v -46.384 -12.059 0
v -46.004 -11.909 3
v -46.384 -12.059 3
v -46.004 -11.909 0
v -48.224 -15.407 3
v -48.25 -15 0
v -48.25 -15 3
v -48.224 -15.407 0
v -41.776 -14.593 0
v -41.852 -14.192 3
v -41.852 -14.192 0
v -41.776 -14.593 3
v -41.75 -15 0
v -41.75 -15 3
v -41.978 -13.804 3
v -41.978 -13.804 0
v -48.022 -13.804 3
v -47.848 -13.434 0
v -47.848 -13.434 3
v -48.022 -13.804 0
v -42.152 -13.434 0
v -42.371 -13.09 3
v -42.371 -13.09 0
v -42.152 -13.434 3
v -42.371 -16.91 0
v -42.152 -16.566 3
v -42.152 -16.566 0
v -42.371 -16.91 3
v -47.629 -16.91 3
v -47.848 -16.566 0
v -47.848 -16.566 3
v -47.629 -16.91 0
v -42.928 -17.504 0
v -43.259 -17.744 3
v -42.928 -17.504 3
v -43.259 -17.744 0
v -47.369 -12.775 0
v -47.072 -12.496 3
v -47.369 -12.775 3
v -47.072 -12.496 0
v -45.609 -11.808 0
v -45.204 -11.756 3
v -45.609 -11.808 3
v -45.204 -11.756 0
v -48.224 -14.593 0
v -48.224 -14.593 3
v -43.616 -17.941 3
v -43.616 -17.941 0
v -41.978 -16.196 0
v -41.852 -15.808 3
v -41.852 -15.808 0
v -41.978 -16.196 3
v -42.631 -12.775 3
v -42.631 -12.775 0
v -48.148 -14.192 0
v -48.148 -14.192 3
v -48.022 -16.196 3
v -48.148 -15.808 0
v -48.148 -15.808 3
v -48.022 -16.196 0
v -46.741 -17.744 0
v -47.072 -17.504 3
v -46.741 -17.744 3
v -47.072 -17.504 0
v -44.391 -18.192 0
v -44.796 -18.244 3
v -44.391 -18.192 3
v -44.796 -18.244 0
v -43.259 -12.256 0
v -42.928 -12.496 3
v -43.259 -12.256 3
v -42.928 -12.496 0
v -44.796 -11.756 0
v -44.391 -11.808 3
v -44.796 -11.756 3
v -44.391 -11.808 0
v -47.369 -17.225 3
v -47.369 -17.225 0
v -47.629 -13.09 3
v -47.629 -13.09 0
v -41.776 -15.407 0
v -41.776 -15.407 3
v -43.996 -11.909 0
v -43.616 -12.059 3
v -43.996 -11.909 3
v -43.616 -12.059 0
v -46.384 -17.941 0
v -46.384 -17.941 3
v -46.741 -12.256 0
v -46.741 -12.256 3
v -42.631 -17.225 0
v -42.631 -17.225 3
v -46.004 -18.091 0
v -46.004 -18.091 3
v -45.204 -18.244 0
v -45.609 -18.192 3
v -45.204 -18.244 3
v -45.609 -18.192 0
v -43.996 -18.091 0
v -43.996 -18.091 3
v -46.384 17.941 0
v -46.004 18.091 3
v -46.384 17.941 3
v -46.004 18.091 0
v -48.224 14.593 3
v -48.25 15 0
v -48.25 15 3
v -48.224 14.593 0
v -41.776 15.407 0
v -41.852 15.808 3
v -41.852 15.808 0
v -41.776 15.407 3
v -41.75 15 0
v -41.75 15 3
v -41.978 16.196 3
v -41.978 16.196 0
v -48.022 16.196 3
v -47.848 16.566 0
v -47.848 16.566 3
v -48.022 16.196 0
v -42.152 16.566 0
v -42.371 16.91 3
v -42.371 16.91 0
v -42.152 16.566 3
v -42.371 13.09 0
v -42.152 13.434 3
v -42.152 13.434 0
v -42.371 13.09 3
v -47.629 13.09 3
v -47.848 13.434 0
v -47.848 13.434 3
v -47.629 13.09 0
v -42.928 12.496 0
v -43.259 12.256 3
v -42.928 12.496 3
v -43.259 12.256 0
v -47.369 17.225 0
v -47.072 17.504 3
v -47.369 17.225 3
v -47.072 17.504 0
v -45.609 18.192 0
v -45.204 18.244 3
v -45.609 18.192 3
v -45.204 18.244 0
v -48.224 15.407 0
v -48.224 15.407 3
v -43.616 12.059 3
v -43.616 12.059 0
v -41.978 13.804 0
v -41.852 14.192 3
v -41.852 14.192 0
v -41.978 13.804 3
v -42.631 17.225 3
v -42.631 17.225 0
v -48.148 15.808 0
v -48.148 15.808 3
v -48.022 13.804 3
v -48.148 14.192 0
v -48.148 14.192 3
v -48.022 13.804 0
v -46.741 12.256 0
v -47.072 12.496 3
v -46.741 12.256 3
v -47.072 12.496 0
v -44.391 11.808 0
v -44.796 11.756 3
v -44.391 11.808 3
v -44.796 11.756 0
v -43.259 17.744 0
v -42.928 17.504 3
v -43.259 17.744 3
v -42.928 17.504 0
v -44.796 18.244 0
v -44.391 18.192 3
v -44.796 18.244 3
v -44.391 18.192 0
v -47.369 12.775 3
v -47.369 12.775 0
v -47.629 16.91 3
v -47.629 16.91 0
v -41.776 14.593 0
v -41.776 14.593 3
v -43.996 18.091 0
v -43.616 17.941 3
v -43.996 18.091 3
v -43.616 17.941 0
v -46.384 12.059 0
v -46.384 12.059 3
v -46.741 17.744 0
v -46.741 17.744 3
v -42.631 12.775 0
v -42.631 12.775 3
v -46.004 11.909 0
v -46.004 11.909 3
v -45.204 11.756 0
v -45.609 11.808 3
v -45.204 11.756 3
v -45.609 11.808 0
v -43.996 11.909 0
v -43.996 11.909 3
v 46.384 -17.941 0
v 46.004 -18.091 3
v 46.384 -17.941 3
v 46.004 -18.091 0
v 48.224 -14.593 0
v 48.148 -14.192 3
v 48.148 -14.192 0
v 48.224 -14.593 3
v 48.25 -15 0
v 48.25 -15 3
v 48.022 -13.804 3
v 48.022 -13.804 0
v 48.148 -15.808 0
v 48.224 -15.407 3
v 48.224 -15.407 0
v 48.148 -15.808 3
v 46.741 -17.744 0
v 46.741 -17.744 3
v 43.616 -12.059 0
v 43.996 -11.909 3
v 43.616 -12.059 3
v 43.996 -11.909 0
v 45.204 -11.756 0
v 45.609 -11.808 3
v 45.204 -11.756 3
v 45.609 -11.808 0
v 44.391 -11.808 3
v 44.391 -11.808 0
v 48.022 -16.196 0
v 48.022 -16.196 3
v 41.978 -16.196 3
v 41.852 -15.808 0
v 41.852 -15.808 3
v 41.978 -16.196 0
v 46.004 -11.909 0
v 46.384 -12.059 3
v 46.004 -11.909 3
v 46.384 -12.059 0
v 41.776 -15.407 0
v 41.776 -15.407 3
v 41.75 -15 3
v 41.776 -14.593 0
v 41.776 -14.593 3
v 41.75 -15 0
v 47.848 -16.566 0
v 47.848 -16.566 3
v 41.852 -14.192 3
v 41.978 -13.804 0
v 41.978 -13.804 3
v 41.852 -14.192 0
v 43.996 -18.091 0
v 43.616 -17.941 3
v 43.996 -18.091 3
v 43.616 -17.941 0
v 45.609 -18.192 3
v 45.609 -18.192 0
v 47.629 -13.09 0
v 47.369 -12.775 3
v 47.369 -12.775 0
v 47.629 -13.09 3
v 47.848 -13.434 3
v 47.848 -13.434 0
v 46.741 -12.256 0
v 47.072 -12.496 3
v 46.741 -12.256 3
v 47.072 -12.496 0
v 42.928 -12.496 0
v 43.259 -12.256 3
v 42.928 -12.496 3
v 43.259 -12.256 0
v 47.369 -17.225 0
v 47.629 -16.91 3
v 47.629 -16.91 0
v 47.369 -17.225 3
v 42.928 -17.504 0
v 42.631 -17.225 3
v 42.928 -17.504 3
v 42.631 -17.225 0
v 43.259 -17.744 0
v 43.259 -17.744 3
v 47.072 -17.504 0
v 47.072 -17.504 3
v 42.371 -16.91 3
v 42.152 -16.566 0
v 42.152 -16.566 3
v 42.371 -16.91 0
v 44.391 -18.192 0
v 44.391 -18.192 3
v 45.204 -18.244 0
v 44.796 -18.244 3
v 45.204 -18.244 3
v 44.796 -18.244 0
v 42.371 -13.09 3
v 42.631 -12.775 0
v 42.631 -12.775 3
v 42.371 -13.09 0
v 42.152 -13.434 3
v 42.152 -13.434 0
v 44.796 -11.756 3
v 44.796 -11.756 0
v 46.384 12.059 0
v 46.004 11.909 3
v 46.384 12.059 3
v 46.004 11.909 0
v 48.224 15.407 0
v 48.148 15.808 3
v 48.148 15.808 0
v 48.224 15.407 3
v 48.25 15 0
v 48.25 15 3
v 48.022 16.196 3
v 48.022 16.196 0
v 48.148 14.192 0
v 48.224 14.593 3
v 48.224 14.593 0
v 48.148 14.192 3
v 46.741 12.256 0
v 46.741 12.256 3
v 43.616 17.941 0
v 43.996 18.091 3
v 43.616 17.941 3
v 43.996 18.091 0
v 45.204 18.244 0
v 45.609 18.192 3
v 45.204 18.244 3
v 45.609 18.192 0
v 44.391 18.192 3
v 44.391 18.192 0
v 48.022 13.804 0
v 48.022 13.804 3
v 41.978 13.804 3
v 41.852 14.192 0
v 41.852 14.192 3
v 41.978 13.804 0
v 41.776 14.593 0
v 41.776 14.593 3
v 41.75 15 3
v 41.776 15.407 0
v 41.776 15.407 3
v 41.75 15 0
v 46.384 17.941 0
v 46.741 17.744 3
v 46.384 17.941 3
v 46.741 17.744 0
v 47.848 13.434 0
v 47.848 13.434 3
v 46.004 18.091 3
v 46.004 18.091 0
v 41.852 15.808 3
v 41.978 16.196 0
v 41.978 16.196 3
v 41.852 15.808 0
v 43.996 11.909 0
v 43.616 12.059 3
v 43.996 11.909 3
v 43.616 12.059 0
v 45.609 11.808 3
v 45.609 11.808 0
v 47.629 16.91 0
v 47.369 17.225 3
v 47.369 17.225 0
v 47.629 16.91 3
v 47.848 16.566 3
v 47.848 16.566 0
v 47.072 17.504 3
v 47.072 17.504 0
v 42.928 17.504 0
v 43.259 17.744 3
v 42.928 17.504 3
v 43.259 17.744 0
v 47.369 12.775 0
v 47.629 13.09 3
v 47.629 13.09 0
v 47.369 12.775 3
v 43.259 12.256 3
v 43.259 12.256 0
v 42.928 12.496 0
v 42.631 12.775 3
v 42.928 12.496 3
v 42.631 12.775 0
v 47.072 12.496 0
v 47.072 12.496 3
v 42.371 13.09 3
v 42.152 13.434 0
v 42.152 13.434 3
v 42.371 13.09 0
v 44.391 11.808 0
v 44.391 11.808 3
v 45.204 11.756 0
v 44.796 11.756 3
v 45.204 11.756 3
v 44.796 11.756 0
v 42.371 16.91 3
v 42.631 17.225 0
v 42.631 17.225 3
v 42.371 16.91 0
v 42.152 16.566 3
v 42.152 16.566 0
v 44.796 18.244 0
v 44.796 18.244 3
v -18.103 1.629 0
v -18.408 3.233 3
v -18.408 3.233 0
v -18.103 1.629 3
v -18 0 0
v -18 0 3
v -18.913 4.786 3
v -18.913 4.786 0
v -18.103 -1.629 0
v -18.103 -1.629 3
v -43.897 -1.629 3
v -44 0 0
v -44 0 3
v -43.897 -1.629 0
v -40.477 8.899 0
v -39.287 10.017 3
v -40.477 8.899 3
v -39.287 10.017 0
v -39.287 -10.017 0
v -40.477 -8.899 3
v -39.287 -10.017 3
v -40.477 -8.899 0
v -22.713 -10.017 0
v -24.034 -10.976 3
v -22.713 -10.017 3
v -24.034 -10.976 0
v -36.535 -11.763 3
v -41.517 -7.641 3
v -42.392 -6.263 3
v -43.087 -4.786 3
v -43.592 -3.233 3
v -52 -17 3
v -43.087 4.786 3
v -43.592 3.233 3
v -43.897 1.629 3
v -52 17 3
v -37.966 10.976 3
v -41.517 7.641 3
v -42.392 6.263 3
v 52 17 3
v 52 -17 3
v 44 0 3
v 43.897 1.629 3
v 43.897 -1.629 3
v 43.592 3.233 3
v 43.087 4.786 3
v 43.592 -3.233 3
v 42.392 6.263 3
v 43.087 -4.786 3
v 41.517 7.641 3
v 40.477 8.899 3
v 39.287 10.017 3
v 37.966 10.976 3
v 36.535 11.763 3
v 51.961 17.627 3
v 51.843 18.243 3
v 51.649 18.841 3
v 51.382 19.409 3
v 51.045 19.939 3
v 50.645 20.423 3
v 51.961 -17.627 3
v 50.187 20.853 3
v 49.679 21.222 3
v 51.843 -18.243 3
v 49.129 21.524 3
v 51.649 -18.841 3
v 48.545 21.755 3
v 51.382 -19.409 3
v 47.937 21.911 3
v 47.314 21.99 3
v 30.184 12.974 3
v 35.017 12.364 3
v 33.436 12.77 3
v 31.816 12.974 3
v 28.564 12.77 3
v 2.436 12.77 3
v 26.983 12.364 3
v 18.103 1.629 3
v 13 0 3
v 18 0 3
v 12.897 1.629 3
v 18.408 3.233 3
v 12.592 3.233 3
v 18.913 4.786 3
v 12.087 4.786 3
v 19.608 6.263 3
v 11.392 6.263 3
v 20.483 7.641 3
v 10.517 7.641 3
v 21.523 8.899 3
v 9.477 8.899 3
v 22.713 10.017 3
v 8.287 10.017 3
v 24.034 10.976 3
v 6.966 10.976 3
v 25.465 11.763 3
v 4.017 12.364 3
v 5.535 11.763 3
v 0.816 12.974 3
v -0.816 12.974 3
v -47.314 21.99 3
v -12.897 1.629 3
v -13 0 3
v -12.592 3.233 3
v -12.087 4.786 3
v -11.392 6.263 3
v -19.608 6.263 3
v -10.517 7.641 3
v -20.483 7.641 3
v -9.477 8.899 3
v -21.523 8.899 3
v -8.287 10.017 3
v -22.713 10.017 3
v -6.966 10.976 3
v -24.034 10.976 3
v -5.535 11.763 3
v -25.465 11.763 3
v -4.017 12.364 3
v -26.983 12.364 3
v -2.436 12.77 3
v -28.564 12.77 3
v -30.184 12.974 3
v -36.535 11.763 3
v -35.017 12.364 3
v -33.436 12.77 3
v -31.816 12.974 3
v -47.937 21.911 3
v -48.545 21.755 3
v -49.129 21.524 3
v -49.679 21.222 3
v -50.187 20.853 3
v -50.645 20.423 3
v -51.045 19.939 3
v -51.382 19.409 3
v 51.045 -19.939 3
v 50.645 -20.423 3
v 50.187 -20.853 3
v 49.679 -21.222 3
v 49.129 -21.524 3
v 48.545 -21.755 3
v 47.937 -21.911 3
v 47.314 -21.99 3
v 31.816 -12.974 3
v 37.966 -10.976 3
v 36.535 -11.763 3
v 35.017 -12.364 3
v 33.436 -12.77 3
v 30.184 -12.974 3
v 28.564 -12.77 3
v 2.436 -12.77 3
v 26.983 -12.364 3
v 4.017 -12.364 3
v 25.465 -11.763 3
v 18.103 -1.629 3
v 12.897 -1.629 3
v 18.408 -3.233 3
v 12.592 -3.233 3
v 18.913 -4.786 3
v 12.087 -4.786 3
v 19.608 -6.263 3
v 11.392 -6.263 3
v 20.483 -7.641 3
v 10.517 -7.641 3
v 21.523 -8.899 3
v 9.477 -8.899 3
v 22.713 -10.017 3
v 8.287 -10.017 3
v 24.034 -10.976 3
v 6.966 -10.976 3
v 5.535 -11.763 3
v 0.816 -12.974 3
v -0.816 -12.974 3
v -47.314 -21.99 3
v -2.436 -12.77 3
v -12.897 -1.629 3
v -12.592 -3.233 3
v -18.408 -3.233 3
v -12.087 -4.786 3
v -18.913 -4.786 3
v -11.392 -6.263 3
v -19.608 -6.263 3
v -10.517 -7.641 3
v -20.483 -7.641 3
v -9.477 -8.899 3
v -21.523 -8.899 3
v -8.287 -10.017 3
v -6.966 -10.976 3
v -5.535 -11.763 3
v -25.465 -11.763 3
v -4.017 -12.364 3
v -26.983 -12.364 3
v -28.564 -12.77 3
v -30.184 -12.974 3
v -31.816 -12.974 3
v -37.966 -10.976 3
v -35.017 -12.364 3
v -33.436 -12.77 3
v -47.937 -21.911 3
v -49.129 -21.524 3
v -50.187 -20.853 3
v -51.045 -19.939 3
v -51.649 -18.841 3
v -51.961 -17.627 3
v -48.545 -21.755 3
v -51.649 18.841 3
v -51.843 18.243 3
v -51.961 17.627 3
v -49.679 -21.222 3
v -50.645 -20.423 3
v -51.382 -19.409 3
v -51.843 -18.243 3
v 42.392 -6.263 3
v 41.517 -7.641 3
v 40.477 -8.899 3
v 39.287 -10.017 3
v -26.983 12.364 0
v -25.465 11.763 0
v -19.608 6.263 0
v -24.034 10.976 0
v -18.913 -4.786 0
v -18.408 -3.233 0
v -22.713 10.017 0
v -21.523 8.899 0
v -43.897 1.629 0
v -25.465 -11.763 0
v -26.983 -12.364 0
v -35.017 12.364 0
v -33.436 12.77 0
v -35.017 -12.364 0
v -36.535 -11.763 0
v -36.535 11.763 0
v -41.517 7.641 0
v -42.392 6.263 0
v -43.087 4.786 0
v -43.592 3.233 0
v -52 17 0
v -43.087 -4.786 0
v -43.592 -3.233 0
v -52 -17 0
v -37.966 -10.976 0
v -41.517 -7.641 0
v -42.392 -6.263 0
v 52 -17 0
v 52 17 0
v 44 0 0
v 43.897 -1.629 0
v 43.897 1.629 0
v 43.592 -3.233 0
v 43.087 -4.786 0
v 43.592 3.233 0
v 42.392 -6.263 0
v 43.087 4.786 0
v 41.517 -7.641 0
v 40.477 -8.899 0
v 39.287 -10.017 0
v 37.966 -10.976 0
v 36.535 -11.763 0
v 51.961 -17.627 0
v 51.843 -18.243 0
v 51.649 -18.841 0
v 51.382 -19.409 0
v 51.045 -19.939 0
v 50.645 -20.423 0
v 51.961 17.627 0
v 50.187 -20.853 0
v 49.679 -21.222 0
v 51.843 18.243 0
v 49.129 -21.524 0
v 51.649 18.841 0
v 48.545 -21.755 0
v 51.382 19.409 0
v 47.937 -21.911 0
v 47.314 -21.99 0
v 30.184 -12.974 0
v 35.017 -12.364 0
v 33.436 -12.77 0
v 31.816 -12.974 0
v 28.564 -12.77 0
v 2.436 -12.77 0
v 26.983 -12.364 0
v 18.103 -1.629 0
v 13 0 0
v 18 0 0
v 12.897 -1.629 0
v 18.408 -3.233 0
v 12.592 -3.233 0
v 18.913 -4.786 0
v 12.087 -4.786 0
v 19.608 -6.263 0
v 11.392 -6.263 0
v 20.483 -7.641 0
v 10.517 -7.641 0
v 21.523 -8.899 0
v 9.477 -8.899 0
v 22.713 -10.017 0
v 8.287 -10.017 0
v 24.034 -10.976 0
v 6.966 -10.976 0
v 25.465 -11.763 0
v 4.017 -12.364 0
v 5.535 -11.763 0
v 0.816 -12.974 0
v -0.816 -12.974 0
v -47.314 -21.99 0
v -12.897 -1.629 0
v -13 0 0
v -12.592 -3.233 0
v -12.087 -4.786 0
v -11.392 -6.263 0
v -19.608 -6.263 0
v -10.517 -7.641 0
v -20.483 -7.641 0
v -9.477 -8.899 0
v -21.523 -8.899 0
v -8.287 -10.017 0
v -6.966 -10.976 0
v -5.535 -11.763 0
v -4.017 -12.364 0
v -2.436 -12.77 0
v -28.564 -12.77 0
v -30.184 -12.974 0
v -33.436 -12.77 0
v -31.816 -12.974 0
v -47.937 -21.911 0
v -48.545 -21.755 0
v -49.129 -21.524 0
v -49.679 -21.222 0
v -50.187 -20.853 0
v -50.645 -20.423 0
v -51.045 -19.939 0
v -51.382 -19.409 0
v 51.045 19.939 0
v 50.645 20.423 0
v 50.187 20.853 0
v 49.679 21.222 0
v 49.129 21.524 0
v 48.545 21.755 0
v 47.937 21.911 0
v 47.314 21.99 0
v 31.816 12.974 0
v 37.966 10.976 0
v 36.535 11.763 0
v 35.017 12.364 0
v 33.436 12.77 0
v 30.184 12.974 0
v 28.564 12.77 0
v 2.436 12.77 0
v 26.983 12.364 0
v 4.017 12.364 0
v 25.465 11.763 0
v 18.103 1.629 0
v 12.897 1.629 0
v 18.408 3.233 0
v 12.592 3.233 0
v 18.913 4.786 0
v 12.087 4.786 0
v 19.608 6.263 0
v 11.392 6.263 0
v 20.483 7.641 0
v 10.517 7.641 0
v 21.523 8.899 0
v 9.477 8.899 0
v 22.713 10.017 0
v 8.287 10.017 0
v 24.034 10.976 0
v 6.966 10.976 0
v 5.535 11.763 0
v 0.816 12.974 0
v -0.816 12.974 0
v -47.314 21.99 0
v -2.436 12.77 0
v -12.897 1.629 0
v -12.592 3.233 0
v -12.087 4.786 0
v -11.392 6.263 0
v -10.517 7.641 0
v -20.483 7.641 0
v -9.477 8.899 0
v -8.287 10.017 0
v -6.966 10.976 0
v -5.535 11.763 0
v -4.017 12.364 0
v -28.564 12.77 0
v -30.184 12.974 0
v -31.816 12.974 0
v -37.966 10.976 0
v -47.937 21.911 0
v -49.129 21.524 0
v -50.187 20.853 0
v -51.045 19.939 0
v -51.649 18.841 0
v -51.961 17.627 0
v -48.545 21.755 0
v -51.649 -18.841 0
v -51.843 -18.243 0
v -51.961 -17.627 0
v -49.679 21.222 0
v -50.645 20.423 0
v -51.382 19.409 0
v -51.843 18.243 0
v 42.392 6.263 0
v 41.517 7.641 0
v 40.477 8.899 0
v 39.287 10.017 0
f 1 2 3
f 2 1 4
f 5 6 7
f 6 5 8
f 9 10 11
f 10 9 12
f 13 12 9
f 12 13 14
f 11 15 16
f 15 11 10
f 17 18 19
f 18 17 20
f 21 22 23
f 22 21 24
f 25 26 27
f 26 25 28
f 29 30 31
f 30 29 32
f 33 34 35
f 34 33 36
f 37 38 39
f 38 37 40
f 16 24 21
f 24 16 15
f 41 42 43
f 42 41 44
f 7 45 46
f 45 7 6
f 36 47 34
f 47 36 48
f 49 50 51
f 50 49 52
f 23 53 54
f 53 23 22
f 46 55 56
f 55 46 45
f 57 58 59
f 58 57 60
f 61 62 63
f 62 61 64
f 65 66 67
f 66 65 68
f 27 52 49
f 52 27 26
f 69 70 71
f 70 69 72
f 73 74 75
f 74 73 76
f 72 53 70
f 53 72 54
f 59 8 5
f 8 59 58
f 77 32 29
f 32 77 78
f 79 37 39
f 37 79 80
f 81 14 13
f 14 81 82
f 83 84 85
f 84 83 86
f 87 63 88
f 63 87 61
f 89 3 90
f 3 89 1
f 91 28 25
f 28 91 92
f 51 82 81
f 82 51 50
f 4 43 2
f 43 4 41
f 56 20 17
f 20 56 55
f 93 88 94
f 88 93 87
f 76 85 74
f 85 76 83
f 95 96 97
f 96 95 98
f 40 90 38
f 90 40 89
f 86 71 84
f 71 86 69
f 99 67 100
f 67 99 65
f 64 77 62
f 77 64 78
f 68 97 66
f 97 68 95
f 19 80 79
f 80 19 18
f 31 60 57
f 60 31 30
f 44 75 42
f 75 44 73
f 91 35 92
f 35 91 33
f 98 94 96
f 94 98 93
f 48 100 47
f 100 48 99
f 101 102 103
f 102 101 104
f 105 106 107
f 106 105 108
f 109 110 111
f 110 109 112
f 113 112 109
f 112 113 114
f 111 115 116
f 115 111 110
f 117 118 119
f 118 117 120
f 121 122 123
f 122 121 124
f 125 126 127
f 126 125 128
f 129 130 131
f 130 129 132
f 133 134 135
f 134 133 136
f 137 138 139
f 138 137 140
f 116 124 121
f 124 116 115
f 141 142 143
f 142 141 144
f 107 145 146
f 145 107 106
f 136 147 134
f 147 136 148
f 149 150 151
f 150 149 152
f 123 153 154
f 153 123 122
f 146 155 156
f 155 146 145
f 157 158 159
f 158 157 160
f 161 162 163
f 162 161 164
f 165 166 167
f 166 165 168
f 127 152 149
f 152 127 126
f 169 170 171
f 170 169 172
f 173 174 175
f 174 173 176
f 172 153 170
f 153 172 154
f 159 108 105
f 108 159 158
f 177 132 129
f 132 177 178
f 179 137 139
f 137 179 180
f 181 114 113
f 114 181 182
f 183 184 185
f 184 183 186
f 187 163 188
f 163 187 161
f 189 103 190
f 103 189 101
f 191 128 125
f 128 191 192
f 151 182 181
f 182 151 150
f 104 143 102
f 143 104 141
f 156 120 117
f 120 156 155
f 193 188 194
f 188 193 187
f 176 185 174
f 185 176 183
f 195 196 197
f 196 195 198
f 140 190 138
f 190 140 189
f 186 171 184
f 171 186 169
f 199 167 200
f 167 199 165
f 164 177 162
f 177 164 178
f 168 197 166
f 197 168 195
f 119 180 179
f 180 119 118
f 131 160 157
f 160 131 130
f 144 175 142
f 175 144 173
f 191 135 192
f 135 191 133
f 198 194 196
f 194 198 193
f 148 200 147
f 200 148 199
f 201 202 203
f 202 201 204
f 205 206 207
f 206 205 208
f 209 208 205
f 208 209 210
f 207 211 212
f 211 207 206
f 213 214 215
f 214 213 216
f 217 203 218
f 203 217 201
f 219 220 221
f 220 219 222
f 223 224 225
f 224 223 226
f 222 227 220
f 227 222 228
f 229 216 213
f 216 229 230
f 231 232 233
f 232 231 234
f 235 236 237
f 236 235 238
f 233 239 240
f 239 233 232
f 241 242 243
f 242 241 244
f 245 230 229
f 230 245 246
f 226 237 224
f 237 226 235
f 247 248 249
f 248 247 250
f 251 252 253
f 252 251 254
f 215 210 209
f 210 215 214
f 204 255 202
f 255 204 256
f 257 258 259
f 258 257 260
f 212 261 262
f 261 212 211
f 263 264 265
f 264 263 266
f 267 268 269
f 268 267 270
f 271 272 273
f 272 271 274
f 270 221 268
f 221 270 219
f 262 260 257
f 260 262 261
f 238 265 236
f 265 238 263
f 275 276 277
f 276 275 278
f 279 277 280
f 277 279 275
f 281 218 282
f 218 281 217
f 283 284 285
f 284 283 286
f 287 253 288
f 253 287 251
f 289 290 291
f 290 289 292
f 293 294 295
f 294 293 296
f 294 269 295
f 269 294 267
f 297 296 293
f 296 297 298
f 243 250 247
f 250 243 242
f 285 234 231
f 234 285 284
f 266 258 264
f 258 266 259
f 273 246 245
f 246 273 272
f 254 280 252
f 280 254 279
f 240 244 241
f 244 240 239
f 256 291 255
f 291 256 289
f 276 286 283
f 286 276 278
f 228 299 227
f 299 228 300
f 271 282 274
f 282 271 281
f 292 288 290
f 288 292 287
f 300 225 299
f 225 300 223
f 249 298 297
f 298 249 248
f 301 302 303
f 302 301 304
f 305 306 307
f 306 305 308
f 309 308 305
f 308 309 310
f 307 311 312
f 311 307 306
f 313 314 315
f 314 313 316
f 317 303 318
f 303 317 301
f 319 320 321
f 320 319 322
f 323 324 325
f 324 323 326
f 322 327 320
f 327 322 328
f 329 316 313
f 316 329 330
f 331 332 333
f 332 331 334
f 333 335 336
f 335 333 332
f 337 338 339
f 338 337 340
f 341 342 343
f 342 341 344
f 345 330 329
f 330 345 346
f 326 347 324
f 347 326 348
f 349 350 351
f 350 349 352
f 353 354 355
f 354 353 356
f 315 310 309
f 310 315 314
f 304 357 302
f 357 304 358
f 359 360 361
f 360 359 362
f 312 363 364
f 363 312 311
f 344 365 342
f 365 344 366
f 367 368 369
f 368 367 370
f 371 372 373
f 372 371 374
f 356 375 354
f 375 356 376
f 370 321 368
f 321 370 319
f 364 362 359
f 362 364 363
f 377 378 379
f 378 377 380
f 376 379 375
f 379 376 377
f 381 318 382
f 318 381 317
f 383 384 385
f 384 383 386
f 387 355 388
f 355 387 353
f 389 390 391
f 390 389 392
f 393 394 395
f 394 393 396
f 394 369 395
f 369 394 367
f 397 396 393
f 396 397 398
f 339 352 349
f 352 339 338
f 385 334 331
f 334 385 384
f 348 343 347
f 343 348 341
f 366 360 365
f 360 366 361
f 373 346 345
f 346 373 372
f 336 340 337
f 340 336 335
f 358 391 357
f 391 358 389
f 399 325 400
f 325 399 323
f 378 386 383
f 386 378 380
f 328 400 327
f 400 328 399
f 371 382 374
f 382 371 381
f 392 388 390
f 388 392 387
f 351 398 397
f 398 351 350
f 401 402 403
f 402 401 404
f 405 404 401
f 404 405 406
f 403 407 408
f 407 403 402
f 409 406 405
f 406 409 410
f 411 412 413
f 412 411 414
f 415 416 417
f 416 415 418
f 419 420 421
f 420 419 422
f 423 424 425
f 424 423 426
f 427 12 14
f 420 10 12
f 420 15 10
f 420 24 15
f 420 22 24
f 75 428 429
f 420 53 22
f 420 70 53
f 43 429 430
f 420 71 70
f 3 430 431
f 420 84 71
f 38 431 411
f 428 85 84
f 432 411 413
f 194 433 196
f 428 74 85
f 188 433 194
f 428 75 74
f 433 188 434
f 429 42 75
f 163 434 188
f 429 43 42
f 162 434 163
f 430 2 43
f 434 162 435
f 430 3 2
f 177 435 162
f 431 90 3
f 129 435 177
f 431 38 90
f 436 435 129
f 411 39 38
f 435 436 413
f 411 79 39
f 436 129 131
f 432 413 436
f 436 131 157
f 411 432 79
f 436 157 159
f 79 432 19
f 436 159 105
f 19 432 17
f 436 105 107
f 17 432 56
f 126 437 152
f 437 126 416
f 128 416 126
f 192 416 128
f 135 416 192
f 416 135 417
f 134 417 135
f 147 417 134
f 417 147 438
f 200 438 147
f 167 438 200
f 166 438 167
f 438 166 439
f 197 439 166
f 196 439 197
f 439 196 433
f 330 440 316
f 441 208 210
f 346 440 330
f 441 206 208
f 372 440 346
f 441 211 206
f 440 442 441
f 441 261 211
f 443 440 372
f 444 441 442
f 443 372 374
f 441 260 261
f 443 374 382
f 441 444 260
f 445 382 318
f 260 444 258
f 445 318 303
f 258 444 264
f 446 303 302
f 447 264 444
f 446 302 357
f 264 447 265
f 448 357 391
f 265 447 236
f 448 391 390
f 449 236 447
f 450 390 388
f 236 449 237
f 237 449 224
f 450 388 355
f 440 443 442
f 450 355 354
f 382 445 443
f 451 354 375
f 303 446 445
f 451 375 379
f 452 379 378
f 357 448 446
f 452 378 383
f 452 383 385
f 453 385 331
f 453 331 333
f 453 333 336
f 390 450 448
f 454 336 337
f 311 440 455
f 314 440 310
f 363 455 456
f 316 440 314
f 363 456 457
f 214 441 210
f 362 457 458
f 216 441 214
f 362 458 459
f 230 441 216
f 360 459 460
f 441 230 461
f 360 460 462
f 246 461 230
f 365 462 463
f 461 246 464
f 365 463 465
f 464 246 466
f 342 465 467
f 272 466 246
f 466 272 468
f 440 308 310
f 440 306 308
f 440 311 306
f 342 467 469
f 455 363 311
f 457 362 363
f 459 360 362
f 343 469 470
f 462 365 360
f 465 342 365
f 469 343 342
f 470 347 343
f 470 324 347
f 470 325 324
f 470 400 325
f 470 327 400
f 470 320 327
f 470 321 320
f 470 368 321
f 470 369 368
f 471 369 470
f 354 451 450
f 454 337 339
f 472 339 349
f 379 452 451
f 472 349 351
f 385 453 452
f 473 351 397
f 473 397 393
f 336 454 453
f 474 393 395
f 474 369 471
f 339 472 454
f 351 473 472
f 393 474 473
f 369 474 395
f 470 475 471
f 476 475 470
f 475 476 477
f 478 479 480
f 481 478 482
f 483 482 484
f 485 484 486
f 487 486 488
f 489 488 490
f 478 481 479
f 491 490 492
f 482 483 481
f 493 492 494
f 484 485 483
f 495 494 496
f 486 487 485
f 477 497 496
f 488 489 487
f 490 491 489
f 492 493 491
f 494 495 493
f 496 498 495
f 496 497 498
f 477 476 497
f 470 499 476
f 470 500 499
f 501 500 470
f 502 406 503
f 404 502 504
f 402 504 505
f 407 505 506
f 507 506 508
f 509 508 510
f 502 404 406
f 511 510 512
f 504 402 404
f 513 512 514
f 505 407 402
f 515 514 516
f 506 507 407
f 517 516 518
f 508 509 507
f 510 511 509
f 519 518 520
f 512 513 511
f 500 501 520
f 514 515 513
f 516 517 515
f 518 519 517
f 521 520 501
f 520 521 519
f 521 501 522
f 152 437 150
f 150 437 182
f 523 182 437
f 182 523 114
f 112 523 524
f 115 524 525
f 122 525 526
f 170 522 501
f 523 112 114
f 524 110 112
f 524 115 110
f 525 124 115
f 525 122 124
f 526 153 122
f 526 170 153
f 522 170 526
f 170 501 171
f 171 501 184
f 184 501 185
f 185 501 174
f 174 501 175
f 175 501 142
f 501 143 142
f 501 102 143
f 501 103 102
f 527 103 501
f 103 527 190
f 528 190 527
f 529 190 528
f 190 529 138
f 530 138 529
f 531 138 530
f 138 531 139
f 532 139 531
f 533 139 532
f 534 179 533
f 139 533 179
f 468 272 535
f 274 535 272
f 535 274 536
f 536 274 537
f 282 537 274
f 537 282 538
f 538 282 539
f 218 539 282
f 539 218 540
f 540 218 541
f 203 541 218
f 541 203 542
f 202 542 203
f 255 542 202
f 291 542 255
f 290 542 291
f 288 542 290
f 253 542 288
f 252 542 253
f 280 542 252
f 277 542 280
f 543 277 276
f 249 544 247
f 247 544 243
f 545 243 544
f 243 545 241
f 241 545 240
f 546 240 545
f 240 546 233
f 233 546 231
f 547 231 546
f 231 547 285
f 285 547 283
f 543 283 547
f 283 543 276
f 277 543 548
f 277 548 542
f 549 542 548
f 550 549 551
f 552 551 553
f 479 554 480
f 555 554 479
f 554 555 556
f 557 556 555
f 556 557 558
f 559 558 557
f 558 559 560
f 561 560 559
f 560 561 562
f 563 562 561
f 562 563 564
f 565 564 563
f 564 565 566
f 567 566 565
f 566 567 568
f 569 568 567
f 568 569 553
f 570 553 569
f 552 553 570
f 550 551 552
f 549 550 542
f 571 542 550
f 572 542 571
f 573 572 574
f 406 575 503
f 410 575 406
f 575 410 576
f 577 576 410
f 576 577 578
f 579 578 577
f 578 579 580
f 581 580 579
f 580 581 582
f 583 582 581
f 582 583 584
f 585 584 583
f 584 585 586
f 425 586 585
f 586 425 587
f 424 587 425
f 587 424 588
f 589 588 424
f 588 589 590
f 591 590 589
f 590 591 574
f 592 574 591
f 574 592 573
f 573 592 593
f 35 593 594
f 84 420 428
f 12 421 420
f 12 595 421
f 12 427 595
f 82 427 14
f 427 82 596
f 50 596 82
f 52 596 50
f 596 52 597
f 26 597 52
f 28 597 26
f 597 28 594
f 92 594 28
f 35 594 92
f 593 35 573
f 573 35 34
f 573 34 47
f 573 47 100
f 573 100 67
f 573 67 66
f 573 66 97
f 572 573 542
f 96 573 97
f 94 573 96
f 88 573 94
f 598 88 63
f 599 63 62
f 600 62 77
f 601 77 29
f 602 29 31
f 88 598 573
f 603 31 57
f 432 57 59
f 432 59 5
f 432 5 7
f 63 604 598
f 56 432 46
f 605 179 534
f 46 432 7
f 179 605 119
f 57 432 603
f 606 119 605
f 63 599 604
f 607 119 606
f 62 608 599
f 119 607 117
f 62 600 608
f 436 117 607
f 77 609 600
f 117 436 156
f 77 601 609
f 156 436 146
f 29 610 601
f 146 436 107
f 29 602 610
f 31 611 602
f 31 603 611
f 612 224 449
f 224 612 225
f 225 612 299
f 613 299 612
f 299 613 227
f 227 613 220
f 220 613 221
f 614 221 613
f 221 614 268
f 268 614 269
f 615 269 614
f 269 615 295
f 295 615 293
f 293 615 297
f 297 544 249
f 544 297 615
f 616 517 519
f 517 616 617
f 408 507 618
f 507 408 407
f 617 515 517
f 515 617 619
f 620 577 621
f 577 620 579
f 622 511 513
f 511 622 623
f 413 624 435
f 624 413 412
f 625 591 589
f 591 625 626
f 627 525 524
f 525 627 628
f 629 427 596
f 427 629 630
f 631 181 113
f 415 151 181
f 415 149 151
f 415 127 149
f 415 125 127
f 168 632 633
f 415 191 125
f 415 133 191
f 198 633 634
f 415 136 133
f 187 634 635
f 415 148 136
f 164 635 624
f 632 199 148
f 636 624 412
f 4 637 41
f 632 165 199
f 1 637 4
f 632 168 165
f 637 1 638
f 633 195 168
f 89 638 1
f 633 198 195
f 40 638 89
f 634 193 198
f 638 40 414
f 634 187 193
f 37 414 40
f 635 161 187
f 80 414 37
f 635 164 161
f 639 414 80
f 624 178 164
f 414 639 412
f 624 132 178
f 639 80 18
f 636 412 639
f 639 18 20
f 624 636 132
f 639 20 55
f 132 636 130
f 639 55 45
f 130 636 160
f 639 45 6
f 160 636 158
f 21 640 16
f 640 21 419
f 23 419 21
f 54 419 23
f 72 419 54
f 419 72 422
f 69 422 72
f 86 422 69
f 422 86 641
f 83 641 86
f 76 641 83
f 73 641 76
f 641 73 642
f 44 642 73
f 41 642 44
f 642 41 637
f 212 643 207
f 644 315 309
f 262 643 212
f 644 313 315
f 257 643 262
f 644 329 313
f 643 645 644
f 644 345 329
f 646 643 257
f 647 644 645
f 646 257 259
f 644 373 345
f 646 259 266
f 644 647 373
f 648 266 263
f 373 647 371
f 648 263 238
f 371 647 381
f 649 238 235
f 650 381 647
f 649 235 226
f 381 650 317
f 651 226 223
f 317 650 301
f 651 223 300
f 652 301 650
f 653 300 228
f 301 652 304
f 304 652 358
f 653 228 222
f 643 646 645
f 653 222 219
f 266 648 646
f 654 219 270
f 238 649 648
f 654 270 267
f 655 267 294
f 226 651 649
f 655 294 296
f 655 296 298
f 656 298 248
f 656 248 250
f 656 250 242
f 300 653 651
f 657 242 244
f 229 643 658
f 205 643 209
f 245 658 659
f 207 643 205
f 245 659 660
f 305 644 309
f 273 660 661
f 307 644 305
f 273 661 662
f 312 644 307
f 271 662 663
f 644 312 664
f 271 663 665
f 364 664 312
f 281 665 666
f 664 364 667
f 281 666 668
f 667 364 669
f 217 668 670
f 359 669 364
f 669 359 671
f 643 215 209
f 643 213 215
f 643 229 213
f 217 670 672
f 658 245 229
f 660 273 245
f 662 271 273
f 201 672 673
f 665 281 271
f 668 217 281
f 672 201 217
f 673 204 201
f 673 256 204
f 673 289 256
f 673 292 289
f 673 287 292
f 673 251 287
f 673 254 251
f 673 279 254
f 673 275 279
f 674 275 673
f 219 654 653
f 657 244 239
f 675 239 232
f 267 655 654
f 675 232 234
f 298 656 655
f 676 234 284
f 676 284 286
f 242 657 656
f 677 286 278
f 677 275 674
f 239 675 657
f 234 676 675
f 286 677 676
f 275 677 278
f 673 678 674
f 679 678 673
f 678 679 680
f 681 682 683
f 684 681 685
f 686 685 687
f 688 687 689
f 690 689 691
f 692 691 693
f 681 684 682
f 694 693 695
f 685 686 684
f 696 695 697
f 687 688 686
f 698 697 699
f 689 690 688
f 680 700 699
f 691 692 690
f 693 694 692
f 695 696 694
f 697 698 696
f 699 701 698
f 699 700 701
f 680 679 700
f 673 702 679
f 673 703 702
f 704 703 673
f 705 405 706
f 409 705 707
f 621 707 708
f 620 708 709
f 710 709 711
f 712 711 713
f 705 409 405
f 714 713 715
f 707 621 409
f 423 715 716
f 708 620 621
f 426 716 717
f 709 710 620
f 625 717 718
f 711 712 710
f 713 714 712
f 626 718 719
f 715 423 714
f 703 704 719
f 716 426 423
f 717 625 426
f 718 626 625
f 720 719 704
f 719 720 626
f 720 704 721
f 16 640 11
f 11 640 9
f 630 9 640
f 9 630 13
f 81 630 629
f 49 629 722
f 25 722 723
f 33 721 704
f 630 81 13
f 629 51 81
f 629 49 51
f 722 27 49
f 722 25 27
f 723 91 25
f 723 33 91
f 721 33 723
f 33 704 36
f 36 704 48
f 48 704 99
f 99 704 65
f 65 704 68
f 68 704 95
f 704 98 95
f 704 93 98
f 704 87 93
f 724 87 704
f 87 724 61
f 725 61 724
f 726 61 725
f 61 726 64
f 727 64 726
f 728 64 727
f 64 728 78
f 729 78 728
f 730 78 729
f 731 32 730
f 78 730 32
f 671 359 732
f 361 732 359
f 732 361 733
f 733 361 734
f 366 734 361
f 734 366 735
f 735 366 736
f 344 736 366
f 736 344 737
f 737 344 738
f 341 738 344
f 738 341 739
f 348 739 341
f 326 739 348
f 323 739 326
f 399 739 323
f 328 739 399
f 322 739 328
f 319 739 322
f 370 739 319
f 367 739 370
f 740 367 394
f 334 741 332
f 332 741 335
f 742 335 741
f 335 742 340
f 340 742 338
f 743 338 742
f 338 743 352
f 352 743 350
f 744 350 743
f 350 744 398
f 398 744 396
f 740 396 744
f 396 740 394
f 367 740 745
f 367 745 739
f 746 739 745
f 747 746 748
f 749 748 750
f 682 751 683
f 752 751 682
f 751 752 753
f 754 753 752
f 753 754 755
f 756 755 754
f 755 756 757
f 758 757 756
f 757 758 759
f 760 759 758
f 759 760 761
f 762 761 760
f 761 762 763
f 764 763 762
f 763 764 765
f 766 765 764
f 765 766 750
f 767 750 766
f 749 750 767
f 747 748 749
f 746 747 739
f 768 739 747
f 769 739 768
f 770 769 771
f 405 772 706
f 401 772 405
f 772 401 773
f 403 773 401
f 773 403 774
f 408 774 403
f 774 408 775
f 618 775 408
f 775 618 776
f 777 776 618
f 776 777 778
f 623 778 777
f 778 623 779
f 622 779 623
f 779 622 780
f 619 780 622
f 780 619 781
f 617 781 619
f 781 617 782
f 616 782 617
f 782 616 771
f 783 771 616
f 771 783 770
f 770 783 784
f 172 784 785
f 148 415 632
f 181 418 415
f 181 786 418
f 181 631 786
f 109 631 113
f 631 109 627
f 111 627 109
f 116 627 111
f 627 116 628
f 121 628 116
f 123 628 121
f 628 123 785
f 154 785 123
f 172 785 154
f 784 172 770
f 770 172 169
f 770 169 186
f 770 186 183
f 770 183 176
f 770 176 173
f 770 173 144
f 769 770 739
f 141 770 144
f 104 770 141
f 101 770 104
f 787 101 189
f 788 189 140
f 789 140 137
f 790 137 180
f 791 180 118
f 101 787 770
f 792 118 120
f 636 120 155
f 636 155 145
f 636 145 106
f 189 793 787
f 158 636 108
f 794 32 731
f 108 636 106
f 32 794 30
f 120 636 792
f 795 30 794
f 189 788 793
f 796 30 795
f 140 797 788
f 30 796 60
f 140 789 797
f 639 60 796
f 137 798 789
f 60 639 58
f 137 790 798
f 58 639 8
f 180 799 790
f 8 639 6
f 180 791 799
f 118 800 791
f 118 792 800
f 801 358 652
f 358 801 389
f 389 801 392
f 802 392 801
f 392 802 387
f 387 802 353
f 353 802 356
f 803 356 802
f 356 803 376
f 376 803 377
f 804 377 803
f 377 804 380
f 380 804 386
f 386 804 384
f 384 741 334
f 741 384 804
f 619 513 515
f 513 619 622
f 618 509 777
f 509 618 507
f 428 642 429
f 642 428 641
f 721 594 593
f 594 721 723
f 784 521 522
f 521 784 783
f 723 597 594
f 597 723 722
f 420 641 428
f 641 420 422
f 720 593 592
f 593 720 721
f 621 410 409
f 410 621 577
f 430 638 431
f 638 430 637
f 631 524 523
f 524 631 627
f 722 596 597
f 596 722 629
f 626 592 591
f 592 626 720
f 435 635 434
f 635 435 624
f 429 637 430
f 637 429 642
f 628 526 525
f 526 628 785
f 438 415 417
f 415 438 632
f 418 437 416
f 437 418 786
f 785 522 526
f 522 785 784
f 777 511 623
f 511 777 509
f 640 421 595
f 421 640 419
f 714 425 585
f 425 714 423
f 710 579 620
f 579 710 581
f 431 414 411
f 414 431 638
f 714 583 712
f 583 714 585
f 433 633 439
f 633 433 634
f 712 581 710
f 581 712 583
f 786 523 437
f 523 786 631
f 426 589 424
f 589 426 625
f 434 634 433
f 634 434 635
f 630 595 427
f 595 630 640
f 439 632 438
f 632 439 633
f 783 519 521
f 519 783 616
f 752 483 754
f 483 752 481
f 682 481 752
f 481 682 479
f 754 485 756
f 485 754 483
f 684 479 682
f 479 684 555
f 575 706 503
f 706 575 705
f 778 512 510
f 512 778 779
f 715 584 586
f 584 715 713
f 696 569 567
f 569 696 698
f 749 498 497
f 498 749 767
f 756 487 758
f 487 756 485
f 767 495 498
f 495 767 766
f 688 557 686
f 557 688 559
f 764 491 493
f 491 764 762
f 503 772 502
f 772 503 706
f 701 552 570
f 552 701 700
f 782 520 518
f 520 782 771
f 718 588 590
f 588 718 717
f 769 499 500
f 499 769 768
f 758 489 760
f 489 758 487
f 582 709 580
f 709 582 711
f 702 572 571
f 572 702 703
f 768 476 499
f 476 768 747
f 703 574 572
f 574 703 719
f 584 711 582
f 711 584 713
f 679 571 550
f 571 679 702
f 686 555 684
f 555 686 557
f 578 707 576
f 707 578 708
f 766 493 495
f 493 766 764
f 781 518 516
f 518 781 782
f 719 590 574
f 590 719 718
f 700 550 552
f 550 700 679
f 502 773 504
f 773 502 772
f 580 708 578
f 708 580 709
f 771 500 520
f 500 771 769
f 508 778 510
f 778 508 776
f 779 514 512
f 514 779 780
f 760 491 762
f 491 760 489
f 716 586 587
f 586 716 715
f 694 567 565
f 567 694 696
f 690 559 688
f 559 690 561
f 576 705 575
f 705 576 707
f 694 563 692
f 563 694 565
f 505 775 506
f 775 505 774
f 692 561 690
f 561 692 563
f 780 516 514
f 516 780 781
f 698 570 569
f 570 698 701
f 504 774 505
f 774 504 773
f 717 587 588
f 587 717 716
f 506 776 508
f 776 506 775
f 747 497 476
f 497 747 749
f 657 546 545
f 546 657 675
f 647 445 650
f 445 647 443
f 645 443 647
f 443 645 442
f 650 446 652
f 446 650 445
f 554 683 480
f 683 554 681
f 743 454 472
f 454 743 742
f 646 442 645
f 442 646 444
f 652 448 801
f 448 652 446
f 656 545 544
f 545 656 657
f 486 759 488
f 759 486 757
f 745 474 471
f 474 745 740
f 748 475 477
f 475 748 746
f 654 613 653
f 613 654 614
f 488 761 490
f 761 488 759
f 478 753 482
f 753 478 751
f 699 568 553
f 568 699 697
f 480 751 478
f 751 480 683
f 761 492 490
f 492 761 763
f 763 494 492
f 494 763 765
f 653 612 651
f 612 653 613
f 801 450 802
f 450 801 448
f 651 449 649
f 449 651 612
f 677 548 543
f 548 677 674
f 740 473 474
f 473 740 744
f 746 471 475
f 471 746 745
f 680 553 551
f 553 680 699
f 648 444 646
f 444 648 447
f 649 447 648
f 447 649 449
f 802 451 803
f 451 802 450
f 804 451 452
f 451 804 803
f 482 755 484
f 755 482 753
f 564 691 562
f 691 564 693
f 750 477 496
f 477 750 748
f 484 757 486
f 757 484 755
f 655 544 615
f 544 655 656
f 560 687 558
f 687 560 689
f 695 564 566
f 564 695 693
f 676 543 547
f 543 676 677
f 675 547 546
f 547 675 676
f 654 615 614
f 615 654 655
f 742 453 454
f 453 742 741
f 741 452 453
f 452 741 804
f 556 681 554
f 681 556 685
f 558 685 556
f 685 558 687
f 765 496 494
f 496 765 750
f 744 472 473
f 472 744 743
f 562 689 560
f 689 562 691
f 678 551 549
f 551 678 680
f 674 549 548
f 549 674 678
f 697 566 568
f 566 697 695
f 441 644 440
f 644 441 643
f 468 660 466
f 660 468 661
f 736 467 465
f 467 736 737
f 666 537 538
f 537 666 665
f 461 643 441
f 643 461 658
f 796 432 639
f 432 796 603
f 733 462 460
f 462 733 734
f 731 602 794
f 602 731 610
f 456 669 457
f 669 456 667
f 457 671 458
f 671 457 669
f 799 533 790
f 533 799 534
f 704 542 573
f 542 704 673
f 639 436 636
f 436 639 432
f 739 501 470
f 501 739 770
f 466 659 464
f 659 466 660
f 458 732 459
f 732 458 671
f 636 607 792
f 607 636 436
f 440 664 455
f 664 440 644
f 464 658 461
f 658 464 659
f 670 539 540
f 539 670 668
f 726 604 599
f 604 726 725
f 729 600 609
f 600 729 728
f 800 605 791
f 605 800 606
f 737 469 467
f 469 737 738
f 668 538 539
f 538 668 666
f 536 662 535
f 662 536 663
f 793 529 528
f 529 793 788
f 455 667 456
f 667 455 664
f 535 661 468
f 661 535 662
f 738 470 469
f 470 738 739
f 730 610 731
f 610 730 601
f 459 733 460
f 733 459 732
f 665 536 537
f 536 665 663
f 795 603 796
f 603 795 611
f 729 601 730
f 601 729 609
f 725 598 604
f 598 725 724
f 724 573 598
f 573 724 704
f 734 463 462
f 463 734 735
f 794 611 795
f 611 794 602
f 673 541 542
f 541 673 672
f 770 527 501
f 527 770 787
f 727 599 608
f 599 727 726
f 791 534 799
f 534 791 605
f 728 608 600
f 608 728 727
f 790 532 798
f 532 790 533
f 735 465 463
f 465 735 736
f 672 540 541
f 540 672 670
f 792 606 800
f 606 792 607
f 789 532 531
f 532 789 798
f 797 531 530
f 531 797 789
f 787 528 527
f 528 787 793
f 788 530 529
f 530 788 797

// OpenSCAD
$fn = 50;

difference() {
	union() {
		hull() {
			translate(v = [-47.0, 17.0, 0]) {
				cylinder(h = 3, r = 5);
			}
			translate(v = [47.0, 17.0, 0]) {
				cylinder(h = 3, r = 5);
			}
			translate(v = [-47.0, -17.0, 0]) {
				cylinder(h = 3, r = 5);
			}
			translate(v = [47.0, -17.0, 0]) {
				cylinder(h = 3, r = 5);
			}
		}
	}
	union() {
		translate(v = [-45.0, -15.0, -100.0]) {
			cylinder(h = 200, r = 3.25);
		}
		translate(v = [-45.0, 15.0, -100.0]) {
			cylinder(h = 200, r = 3.25);
		}
		translate(v = [45.0, -15.0, -100.0]) {
			cylinder(h = 200, r = 3.25);
		}
		translate(v = [45.0, 15.0, -100.0]) {
			cylinder(h = 200, r = 3.25);
		}
		translate(v = [-45.0, -15.0, -100.0]) {
			cylinder(h = 200, r = 1.8);
		}
		translate(v = [-45.0, 15.0, -100.0]) {
			cylinder(h = 200, r = 1.8);
		}
		translate(v = [45.0, -15.0, -100.0]) {
			cylinder(h = 200, r = 1.8);
		}
		translate(v = [45.0, 15.0, -100.0]) {
			cylinder(h = 200, r = 1.8);
		}
		translate(v = [-31.0, 0, 0.0]) {
			cylinder(h = 3, r = 13.0);
		}
		cylinder(h = 3, r = 13.0);
		translate(v = [31.0, 0, 0.0]) {
			cylinder(h = 3, r = 13.0);
		}
	}
}
